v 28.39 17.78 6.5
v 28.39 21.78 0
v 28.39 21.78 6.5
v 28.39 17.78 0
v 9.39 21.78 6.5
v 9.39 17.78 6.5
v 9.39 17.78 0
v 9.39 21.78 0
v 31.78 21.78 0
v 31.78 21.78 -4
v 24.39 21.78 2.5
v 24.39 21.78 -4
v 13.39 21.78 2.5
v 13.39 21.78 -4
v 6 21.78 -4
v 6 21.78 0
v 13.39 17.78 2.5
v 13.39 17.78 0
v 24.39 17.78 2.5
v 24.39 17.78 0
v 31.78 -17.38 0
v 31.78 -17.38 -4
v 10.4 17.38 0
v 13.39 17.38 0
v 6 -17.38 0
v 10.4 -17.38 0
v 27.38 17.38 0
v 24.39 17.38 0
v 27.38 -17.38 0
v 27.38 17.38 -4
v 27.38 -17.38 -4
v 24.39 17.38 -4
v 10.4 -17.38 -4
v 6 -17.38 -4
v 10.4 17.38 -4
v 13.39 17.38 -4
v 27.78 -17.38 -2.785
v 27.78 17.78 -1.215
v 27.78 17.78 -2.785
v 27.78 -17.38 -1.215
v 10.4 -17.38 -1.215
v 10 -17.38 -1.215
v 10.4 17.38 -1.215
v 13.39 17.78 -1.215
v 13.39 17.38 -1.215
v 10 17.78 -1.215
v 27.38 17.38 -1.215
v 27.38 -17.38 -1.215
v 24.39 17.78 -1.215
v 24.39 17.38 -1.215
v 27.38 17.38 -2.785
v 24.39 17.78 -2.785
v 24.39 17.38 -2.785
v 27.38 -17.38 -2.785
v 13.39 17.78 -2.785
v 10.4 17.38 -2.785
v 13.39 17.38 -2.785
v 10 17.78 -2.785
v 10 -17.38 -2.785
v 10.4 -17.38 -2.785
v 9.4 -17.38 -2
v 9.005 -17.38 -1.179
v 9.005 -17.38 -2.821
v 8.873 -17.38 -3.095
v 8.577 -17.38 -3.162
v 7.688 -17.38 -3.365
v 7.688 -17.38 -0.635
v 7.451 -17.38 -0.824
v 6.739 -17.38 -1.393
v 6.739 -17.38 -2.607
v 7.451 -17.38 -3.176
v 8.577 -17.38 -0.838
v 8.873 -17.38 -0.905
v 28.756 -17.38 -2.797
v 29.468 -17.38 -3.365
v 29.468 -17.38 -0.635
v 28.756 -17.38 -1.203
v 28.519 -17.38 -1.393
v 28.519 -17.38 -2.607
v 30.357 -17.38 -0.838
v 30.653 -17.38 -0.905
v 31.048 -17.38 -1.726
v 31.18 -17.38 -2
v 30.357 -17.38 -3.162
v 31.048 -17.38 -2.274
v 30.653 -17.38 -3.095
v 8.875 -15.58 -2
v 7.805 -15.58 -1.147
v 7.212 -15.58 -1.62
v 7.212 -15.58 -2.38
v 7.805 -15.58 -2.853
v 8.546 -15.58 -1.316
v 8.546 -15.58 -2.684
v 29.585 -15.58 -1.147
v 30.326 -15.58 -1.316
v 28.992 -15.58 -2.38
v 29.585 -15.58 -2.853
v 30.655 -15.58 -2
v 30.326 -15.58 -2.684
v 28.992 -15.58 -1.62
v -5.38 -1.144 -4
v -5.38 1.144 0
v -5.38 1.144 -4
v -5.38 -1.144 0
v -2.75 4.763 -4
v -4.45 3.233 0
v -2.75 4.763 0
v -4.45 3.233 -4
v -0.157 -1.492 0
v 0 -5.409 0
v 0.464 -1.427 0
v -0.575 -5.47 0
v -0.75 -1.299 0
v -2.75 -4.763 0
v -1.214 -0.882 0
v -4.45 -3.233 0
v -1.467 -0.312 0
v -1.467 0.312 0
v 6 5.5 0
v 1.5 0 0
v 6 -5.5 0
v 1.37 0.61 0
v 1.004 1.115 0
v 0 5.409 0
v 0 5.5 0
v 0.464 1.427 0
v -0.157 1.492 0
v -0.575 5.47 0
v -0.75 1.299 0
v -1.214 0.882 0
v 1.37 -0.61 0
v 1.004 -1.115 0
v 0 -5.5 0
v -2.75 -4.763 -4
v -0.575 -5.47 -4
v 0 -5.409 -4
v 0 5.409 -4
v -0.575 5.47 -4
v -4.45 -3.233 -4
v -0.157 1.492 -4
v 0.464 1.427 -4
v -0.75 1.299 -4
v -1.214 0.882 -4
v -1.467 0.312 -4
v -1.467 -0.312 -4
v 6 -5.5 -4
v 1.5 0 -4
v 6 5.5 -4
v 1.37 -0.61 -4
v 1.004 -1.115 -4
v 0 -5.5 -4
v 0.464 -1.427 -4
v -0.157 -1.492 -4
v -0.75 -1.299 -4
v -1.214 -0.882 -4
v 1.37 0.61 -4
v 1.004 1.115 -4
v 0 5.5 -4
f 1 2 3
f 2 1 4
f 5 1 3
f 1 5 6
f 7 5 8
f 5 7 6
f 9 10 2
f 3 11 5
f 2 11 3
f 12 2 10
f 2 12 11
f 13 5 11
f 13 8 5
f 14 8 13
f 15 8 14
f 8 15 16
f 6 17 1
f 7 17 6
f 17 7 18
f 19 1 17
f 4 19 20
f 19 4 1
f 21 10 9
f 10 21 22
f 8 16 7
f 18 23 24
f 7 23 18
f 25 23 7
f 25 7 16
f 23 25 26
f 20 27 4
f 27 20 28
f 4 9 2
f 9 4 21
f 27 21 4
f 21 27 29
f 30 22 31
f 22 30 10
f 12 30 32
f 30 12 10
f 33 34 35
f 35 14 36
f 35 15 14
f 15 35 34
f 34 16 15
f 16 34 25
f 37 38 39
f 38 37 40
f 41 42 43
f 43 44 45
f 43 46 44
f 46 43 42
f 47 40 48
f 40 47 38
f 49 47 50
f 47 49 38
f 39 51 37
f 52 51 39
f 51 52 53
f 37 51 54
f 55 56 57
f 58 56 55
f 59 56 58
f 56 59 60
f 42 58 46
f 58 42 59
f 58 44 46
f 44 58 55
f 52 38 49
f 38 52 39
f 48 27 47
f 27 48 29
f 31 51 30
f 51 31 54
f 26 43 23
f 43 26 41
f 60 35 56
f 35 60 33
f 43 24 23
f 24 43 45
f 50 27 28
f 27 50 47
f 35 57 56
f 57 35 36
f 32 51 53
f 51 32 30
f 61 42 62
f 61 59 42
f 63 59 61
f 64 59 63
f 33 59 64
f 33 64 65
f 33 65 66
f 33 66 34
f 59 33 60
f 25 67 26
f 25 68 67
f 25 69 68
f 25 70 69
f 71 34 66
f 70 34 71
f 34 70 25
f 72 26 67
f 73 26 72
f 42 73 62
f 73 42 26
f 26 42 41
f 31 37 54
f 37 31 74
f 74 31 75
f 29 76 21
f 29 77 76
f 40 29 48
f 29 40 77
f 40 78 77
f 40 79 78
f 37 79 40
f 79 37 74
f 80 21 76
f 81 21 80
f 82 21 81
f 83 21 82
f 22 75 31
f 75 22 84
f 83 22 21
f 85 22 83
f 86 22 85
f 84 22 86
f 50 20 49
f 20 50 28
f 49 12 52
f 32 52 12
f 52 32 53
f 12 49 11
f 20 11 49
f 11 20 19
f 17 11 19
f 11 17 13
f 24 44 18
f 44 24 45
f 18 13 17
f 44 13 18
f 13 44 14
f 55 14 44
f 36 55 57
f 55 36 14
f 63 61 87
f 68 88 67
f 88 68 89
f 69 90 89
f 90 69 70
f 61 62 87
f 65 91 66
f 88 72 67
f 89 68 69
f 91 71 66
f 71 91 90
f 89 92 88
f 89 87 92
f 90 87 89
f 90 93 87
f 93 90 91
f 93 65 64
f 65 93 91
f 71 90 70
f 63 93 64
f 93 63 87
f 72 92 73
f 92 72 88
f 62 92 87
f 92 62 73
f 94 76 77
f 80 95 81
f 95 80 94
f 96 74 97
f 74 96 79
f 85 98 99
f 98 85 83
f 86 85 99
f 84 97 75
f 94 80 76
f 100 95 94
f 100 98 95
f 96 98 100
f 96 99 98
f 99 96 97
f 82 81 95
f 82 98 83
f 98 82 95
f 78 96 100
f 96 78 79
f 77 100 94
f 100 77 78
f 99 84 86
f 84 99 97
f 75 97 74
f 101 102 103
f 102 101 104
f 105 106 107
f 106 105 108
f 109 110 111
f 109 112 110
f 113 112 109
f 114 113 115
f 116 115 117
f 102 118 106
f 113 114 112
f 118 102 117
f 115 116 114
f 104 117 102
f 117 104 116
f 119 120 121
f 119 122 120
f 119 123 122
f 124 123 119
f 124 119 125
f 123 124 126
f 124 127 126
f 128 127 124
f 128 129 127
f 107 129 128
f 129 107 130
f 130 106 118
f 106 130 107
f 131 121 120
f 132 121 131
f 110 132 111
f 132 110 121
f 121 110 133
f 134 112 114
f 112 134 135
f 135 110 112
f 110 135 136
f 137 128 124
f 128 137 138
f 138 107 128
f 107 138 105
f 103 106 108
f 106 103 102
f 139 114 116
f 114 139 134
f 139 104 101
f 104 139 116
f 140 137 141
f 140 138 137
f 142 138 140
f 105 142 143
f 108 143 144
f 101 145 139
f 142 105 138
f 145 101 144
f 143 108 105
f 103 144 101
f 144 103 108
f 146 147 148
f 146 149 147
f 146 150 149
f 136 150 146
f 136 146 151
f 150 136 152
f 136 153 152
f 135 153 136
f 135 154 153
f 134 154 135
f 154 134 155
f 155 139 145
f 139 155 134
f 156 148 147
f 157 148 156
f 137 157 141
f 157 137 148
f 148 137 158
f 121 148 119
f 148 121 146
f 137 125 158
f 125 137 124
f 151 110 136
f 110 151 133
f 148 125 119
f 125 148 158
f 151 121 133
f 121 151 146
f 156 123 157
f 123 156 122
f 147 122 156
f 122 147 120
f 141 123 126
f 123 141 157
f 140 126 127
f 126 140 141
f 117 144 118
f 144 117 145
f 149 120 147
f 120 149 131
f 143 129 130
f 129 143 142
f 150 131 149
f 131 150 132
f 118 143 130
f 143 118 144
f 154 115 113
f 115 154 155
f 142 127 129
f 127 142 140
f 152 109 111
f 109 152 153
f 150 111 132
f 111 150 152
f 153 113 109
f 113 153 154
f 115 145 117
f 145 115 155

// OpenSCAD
// file: teensy-holder.scad
/*
--- BEGIN AGPLv3-preamble ---
Dactyl Marshmallow ergonomic keyboard generator
Copyright (C) 2015, 2018 Matthew Adereth and Jared Jennings

This program is free software: you can redistribute it and/or modify
it under the terms of the GNU Affero General Public License as published by
the Free Software Foundation, either version 3 of the License, or
(at your option) any later version.

This program is distributed in the hope that it will be useful,
but WITHOUT ANY WARRANTY; without even the implied warranty of
MERCHANTABILITY or FITNESS FOR A PARTICULAR PURPOSE.  See the
GNU Affero General Public License for more details.

You should have received a copy of the GNU Affero General Public License
along with this program.  If not, see <http://www.gnu.org/licenses/>.
--- END AGPLv3-preamble ---
*/
/*
*/
frame_thickness = 4;
small=0.01;
tau=360;

/* https://www.pjrc.com/teensy/dimensions.html
teensy lc */
tb_width = 17.78;
tb_length = 35.56;
tb_thickness = 1.57;
tb_margin = 0.8;

/* https://www.cs.jhu.edu/~carlson/download/datasheets/Micro-USB_1_01.pdf
*/
overmold_width = 11;
overmold_height = 9;

/* How much smaller the bumps are than the holes. First refined in the
 * frame glue joints. */
bump_tolerance = 0.1;
/* Hole diameter is set empirically, so that given the fn used, it
looks like the walls of the hole will be thick enough */
hole_diameter = frame_thickness - 0.5;
hole_fn = 7;

/* M3 screw */
screw_diameter = 3;

module teensy_holder() {
    difference() {
        union() {
             /* square at USB end leaving clearance for largest
              * possible connector overmold */
            translate([0, 
            tb_length/2+frame_thickness/2, 0]) {
                cube(size=[
                overmold_width+2*frame_thickness,
                frame_thickness,
                overmold_height+2*frame_thickness],
                center=true);
            }
            /* main frame */
            cube(size=[
                tb_width+2*frame_thickness,
                tb_length+2*frame_thickness,
                frame_thickness], center=true);
        }
        /* the board */
        cube(size=[
            tb_width, tb_length,
            tb_thickness],
            center=true);
        /* a little extra plastic on top and below the board, to hold
         * it in */
        cube(size=[
            tb_width - tb_margin,
            tb_length - tb_margin,
            frame_thickness+small],
            center=true);
        /* connector overmold */
        translate([0, tb_length/2, 0]) {
            cube(size=[
            overmold_width,
            2*frame_thickness+small,
            overmold_height], center=true);
        }
        /* you know, i bet we don't need the bottom half of that
         * overmold surround */
        translate([0, 0, -(frame_thickness/2 + overmold_height/2)]) {
             cube(size=[2*tb_width, 2*tb_length, overmold_height],
                  center=true);
        }
    }
}

/* left of x=0 */
module tab () {
     translate([-screw_diameter*2, 0, 0]) {
          difference () {
               union () {
                    cylinder(h=frame_thickness,
                             d=screw_diameter+frame_thickness*2,
                             center=true,
                             $fn=15);
                    translate([screw_diameter, 0, 0]) {
                         cube([screw_diameter*2,
                               screw_diameter+frame_thickness*2,
                               frame_thickness],
                              center=true);
                    }
               }
               cylinder(h=frame_thickness+small,
                        d=screw_diameter,
                        center=true,
                        $fn=15);
          }
     }
}

module teensy_holder_piece_a () {
     translate([(tb_width/2+frame_thickness+screw_diameter*2),
                0,
                (-frame_thickness/2)]) {
          union() {
               difference() {
                    intersection() {
                         translate([0, frame_thickness+tb_margin/2+small/2, 0]) {
                              cube(size=[
                                        tb_width+2*frame_thickness+small,
                                        tb_length+2*frame_thickness+small,
                                        overmold_height+2*frame_thickness+small],
                                   center=true);
                         }
                         teensy_holder() {}
                    }
                    translate([-(tb_width/2 + frame_thickness/2),
                               -(tb_length/2 + tb_margin),
                               0]) {
                         rotate(-tau/4,[1,0,0]) {
                              cylinder(h=3,
                                       d1=hole_diameter,
                                       d2=hole_diameter/2,
                                       $fn=hole_fn);
                         }
                    }
                    translate([(tb_width/2 + frame_thickness/2),
                               -(tb_length/2 + tb_margin),
                               0]) {
                         rotate(-tau/4,[1,0,0]) {
                              cylinder(h=3,
                                       d1=hole_diameter,
                                       d2=hole_diameter/2,
                                       $fn=hole_fn);
                         }
                    }
               }
               translate([-(tb_width/2+frame_thickness), 0, 0]) {
                    tab() {}
               }
          }
     }
}

module teensy_holder_piece_b () {
     translate([(tb_width/2+frame_thickness+screw_diameter*2),
                0,
                (-frame_thickness/2)]) {
          union() {
              intersection() {
                   translate([0, -(tb_length+frame_thickness)/2, 0]) {
                        cube(size=[tb_width+2*frame_thickness+small,
                                   frame_thickness+tb_margin,
                                   overmold_height+2*frame_thickness+small],
                             center=true);
                   }
                   teensy_holder() {}
              }
              translate([-(tb_width/2 + frame_thickness/2),
                         -(tb_length/2 + tb_margin),
                         0]) {
                   rotate(-tau/4,[1,0,0]) {
                        cylinder(h=3,
                                 d1=hole_diameter-(bump_tolerance*2),
                                 d2=hole_diameter/2-(bump_tolerance*2),
                                 $fn=hole_fn);
                   }
              }
              translate([(tb_width/2 + frame_thickness/2),
                         -(tb_length/2 + tb_margin),
                         0]) {
                   rotate(-tau/4,[1,0,0]) {
                        cylinder(h=3,
                                 d1=hole_diameter-(bump_tolerance*2),
                                 d2=hole_diameter/2-(bump_tolerance*2),
                                 $fn=hole_fn);
                   }
              }
          }
     }
}
// main file
/*
--- BEGIN AGPLv3-preamble ---
Dactyl Marshmallow ergonomic keyboard generator
Copyright (C) 2015, 2018 Matthew Adereth and Jared Jennings

This program is free software: you can redistribute it and/or modify
it under the terms of the GNU Affero General Public License as published by
the Free Software Foundation, either version 3 of the License, or
(at your option) any later version.

This program is distributed in the hope that it will be useful,
but WITHOUT ANY WARRANTY; without even the implied warranty of
MERCHANTABILITY or FITNESS FOR A PARTICULAR PURPOSE.  See the
GNU Affero General Public License for more details.

You should have received a copy of the GNU Affero General Public License
along with this program.  If not, see <http://www.gnu.org/licenses/>.
--- END AGPLv3-preamble ---
*/
/*
*/
use <teensy-holder.scad>;

teensy_holder_piece_a() {}
